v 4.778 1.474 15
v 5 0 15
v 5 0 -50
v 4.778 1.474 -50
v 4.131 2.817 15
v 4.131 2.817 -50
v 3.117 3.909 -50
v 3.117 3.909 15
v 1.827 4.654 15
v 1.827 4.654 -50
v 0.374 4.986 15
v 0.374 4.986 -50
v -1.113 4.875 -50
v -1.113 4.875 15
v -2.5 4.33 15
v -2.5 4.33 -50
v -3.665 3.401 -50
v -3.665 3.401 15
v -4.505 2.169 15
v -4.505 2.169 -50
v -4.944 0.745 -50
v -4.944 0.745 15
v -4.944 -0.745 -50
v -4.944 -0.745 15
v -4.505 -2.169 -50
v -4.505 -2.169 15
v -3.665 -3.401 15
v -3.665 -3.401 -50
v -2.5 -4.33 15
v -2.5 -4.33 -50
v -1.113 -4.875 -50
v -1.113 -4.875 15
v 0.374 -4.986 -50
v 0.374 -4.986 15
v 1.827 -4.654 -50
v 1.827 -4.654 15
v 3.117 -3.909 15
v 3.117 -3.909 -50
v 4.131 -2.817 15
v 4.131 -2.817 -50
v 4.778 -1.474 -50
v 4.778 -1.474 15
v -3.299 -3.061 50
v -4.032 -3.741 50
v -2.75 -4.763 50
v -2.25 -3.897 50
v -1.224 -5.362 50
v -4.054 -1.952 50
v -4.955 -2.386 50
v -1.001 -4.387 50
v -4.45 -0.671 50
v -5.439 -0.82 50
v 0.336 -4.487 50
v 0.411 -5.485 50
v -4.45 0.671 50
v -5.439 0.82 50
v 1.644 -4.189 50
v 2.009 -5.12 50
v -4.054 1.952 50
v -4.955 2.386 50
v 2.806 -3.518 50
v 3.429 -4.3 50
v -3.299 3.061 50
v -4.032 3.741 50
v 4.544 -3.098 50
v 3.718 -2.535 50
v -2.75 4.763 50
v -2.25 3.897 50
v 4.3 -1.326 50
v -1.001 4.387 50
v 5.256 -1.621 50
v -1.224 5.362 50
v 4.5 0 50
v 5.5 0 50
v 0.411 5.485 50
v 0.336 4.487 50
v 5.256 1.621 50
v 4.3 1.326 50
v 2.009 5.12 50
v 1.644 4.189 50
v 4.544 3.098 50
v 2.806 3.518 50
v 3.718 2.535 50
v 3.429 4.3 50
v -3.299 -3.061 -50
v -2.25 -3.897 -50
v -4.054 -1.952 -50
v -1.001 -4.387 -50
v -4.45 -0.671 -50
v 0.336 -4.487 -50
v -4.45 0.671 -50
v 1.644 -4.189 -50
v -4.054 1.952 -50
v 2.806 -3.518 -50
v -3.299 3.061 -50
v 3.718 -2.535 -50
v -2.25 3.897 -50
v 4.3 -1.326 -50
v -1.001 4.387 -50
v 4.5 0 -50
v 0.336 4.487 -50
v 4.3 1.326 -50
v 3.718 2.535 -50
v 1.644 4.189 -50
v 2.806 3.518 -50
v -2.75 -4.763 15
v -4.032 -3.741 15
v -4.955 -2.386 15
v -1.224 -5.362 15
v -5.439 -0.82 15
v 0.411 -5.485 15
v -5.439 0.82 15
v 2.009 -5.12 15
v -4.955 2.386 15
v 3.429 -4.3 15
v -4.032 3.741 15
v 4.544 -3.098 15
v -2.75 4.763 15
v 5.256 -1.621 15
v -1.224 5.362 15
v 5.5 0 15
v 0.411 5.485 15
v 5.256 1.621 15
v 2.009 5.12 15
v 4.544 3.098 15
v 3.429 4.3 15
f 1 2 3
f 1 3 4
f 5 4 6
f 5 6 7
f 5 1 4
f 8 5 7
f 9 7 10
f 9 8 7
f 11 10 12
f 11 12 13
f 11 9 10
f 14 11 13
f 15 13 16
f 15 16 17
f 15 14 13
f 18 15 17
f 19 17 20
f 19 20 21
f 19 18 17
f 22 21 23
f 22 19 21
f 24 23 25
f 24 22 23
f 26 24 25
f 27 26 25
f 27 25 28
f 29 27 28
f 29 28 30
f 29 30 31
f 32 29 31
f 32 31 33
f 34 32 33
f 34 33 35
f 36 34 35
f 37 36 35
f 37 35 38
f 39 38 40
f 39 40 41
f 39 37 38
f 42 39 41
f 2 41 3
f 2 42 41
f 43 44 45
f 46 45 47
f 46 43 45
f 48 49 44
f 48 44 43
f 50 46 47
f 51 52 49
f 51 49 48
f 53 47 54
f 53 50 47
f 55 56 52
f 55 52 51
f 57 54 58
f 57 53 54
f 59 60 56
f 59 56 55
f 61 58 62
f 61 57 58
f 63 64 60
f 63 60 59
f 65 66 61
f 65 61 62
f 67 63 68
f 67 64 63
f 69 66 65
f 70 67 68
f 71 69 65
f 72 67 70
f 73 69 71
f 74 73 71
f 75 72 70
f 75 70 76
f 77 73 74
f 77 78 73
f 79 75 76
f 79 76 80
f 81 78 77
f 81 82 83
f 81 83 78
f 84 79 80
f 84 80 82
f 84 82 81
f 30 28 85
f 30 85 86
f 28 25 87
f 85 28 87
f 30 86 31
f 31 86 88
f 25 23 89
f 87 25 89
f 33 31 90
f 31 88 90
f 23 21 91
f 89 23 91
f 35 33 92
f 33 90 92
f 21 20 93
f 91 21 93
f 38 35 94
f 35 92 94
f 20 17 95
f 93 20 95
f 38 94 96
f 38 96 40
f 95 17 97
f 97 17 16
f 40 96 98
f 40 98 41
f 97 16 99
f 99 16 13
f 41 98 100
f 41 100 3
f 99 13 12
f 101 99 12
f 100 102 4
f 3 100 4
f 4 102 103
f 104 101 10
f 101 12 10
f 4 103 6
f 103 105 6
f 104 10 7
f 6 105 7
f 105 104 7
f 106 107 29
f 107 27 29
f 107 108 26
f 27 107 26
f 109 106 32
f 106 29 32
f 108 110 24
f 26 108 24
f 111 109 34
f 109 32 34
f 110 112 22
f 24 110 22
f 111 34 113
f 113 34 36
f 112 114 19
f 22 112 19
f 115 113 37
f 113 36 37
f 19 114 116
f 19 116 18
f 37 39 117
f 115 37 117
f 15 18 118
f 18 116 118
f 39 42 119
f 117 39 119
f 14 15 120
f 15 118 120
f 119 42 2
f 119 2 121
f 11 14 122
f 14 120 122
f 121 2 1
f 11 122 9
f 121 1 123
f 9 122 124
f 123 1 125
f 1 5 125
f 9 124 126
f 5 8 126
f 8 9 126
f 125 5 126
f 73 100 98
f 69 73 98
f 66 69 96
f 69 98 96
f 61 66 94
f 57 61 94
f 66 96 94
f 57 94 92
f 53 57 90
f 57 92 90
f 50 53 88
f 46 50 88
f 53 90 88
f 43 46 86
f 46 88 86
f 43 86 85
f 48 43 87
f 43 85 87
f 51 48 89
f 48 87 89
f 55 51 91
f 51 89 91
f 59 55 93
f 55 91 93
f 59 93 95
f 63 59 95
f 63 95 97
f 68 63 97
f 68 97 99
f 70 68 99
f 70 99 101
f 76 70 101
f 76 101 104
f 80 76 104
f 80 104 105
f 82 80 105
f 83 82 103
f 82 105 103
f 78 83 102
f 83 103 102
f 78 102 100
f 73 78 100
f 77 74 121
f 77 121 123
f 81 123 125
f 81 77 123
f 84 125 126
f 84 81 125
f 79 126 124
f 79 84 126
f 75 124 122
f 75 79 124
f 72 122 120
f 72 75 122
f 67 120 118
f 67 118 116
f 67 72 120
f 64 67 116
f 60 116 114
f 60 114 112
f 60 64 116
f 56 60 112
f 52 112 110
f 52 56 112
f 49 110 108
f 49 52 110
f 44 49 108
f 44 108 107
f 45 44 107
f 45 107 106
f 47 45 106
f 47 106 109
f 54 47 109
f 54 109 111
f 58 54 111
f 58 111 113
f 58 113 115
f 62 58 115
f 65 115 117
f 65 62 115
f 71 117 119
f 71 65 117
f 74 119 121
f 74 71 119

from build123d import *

# Parameters (mm, degrees)
F0_R     = 5
F1_DEPTH = 50
F3_R     = 4.5
F4_DEPTH = 100
F5_R     = 5.5
F5_R_2   = 5
F6_DEPTH = 35


with BuildPart() as f1:
    # F0 (on Top) → F1 (new body)
    with BuildSketch(Plane.XY):
        Circle(F0_R)
    extrude(amount=F1_DEPTH)

    # F2: F1 across face


with BuildPart() as f1_1:
    add(f1.part)
    add(f1.part.mirror(Plane(origin=(0, 0, 0), x_dir=(1, 0, 0), z_dir=(0, 0, -1))))

    # F3 (on face) → F4 (cut)
    with BuildSketch(Plane(origin=(0, 0, -50), x_dir=(1, 0, 0), z_dir=(0, 0, -1))):
        Circle(F3_R)
    extrude(amount=-F4_DEPTH, mode=Mode.SUBTRACT)

    # F5 (on face) → F6 (join)
    with BuildSketch(Plane.XY.offset(50)):
        Circle(F5_R)
        Circle(F5_R_2, mode=Mode.SUBTRACT)
    extrude(amount=-F6_DEPTH)


solid = f1_1.part
